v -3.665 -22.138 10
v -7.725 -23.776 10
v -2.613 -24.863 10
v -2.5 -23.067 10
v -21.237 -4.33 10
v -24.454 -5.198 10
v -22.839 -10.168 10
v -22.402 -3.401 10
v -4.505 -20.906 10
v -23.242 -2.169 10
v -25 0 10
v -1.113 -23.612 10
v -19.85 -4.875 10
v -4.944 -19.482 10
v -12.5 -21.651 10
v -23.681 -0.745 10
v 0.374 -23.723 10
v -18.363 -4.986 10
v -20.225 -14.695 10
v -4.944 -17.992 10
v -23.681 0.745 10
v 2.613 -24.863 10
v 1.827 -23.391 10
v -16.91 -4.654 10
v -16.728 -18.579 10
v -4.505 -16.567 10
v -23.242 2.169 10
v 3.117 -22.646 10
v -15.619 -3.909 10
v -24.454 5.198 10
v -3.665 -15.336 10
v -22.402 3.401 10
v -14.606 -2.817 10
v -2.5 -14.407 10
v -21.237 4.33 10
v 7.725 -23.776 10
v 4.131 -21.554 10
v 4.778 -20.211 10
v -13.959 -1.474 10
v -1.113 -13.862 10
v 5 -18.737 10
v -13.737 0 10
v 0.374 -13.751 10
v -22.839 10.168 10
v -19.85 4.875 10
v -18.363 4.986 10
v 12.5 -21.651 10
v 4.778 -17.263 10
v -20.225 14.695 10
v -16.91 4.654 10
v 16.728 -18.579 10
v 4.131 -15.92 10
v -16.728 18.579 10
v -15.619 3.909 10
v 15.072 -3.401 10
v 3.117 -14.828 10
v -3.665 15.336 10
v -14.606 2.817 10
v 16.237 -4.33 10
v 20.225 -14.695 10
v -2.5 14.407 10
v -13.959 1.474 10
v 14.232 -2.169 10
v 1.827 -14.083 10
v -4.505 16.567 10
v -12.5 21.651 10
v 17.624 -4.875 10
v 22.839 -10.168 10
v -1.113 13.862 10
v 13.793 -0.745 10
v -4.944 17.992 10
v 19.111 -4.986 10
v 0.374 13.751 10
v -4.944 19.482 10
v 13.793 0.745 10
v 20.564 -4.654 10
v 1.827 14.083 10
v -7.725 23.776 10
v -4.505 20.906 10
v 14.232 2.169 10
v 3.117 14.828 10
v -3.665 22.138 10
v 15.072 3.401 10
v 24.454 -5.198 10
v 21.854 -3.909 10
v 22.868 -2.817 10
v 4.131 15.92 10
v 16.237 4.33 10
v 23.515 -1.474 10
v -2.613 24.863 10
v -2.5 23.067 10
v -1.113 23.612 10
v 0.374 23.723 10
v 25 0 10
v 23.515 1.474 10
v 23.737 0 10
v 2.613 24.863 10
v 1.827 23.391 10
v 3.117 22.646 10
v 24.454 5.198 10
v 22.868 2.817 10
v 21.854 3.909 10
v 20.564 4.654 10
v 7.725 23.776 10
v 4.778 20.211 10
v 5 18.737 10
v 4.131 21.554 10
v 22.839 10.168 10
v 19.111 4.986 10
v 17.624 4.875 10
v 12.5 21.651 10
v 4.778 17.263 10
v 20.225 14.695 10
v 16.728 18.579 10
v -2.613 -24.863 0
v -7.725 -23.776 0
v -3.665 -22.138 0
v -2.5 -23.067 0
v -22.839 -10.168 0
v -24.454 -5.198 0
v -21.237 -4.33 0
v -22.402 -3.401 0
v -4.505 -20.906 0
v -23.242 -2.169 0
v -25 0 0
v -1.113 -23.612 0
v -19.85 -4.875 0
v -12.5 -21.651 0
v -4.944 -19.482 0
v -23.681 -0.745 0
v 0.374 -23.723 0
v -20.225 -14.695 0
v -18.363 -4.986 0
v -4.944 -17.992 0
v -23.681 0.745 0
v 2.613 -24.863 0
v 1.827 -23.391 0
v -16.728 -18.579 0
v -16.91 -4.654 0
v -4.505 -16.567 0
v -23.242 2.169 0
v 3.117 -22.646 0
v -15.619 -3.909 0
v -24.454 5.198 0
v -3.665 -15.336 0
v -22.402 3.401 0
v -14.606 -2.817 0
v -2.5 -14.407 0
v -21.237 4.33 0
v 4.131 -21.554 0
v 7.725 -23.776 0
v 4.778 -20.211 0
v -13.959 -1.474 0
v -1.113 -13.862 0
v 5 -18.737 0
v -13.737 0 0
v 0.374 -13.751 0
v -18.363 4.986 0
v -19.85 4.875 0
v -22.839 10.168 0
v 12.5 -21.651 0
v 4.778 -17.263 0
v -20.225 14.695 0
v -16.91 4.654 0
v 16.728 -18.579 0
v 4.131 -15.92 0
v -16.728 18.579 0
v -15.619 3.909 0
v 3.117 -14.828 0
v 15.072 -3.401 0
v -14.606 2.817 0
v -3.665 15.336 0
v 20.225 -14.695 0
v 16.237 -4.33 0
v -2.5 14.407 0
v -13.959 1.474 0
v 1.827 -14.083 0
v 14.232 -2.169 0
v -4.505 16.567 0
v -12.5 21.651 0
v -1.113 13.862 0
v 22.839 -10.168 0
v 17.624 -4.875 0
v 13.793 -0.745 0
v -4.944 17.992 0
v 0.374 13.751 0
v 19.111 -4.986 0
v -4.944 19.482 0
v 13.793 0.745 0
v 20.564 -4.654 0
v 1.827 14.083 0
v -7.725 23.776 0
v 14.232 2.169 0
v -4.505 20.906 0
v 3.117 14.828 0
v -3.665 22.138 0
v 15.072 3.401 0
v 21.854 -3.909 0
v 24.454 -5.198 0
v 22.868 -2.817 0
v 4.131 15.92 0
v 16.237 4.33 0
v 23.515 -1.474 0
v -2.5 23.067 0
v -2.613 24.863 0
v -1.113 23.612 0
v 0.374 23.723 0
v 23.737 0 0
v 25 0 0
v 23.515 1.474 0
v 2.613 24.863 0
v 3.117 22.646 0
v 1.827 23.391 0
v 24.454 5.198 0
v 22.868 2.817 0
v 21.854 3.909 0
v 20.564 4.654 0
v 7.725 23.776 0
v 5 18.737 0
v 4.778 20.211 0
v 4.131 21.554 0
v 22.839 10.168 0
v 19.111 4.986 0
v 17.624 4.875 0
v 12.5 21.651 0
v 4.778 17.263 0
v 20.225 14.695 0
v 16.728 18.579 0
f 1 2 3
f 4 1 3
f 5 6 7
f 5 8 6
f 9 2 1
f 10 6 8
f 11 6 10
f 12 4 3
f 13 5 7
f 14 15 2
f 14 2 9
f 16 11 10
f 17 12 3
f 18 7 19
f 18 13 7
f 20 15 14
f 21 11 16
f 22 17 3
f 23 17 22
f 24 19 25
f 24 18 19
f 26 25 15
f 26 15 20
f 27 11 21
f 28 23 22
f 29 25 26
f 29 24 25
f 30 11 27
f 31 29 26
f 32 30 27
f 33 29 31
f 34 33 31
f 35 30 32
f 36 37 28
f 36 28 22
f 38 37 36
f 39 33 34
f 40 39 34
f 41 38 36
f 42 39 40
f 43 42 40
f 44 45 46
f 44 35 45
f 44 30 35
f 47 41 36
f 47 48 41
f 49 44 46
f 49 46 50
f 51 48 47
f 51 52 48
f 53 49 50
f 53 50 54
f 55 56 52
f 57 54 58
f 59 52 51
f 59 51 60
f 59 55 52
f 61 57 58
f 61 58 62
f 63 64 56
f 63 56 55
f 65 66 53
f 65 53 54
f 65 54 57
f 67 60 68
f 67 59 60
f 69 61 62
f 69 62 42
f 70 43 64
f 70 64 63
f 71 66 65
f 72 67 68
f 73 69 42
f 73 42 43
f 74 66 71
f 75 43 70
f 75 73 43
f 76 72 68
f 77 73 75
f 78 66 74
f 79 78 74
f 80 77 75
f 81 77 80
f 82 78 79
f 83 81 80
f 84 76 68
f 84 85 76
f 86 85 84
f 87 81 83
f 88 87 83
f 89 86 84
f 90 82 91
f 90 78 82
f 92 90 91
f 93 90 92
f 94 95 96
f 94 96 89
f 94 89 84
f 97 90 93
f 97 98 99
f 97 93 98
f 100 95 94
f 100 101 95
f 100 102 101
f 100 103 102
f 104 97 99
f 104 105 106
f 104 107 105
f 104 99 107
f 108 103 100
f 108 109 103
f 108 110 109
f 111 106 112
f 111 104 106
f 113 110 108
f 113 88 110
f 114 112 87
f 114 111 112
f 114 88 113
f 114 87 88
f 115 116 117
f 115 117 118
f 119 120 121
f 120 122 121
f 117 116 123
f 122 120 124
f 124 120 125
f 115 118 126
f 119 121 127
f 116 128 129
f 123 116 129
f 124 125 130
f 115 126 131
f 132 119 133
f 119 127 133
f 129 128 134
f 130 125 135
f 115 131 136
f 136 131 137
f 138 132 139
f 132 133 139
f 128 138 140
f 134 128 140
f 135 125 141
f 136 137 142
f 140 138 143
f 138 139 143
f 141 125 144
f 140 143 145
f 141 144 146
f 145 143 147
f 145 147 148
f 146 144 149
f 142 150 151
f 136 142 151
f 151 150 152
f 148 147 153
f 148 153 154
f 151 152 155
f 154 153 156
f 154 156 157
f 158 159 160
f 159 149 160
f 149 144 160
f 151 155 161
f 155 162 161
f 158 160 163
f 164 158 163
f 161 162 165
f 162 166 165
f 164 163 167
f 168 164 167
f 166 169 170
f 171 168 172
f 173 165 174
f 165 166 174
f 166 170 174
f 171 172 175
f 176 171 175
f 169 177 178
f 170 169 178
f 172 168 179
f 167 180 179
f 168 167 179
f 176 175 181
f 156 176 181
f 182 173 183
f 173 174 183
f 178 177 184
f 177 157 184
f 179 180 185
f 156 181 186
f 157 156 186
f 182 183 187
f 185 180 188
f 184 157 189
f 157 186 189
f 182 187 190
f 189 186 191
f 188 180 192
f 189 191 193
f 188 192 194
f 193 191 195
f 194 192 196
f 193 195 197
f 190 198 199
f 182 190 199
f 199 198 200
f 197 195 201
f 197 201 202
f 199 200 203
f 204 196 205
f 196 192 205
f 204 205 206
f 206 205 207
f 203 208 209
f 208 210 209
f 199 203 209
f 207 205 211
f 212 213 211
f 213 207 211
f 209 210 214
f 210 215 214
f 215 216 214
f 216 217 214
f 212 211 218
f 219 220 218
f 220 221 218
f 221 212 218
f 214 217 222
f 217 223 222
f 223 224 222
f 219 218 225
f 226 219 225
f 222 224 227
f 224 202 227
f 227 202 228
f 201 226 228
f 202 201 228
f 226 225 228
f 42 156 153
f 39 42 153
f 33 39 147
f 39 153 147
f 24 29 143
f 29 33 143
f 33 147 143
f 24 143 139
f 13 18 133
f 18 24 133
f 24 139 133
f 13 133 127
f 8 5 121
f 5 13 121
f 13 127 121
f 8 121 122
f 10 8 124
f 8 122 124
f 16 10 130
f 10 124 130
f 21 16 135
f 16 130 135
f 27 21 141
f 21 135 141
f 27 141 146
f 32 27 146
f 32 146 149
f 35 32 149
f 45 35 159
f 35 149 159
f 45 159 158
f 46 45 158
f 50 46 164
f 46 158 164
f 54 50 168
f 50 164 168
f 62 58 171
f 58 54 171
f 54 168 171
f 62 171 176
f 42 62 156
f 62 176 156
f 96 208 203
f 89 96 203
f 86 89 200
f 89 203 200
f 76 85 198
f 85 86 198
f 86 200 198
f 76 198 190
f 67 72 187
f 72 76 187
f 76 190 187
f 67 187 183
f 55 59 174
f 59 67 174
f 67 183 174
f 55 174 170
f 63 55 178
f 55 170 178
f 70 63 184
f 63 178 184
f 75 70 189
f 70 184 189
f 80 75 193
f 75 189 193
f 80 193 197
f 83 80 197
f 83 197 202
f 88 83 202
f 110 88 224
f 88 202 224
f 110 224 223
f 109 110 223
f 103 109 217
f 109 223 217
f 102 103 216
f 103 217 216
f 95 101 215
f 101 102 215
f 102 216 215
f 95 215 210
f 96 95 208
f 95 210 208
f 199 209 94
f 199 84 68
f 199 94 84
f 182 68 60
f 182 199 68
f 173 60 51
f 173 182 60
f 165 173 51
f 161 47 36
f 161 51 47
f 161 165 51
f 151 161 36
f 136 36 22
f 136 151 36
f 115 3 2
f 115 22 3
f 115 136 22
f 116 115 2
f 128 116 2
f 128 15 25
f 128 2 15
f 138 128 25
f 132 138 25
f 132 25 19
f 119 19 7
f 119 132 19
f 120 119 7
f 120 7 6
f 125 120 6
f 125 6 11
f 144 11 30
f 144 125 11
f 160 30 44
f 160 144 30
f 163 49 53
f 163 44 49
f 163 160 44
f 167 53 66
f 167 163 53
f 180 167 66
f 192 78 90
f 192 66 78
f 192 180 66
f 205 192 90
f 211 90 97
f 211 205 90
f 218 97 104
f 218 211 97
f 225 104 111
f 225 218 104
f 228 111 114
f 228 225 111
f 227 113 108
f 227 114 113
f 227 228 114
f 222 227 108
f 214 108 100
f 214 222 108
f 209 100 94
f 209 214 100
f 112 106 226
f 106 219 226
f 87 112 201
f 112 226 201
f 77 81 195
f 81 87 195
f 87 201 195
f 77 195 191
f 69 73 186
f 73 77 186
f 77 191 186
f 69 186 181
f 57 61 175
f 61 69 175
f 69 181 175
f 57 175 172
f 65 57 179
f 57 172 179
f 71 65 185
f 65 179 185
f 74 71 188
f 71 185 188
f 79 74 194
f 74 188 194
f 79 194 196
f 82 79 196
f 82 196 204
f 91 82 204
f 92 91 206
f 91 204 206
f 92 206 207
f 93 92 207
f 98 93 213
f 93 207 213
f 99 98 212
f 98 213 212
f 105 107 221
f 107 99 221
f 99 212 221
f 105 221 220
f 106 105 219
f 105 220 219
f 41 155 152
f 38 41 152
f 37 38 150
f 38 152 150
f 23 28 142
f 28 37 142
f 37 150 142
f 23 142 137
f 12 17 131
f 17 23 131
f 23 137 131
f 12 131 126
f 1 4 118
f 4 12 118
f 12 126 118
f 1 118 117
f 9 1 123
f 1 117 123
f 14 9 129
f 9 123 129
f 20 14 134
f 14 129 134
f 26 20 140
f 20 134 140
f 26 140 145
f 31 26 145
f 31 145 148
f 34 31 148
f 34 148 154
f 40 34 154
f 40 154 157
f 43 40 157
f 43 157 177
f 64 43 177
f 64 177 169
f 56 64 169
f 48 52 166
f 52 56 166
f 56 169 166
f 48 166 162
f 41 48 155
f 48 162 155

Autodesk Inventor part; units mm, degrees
ref_plane "YZ Plane" through (0, 0, 0) normal (1, 0, 0) x (0, 1, 0)
ref_plane "XZ Plane" through (0, 0, 0) normal (0, 1, 0) x (-1, 0, 0)
ref_plane "XY Plane" through (0, 0, 0) normal (0, 0, 1) x (1, 0, 0)
sketch "Sketch1" plane through (0, 0, 0) normal (0, 0, 1) x (1, 0, 0)
  circle A0 centre (0, 0) radius 25
  circle A1 centre (0, 18.7369) radius 5
  circle A2 centre (-18.7369, 0) radius 5
  circle A3 centre (0, -18.7369) radius 5
  circle A4 centre (18.7369, 0) radius 5
  dimension "d0" = 50
  dimension "d1" = 10
  dimension "d4" = 360
extrude "Extrusion1" add sketch "Sketch1" along normal blind 10
